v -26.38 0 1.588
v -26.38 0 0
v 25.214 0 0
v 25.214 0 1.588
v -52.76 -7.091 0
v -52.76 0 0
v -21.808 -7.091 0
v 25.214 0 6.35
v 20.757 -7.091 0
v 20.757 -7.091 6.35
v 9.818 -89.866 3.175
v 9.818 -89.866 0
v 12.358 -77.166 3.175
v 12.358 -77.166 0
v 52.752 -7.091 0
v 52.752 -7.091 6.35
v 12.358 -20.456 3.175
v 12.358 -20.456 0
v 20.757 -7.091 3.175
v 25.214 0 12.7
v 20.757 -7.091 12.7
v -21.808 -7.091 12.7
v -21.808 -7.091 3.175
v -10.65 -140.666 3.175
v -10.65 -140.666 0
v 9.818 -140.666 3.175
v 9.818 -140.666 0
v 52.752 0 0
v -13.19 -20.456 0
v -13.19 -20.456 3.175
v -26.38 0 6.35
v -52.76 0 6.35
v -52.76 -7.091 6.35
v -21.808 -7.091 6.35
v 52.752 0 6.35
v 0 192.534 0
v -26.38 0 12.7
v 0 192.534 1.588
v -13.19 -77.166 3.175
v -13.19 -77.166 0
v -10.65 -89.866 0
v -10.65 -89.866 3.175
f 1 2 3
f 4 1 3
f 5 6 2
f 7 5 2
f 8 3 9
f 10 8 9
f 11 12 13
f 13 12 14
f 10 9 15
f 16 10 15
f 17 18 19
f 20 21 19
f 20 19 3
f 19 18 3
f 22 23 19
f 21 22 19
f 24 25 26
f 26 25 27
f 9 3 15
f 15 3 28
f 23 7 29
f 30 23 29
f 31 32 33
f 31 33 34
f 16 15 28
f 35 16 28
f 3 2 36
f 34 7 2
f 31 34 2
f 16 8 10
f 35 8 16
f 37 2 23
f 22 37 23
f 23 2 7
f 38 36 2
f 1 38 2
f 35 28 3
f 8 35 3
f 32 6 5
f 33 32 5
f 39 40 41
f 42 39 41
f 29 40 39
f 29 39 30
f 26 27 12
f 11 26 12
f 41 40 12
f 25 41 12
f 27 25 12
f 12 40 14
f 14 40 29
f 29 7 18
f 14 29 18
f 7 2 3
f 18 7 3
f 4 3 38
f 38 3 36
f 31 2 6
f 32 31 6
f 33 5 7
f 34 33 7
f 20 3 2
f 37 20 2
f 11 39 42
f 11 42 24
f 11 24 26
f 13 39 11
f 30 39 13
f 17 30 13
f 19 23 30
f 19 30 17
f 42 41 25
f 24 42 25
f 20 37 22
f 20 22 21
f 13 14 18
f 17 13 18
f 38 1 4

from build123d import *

# Parameters (mm, degrees)
F1_DEPTH = 1.5875
F2_DEPTH = 6.35
F3_DEPTH = 12.7
F0_W     = 25.548312813
F0_H     = 56.7093666971
F4_DEPTH = 3.175


# Not quite as in the source:
# - a length typed as a fraction of an inch, garbled in the dataset ("3 / 203.2 mm" for 3/8 in), is restored


with BuildPart() as f1:
    # F0 (on Top) → F1 (new body)
    with BuildSketch(Plane.XY):
        Polygon((0, 192.5335675478), (0, 0), (25.2136345953, 0), align=None)
        Polygon((-26.3801887631, 0), (0, 0), (0, 192.5335675478), align=None)
    extrude(amount=F1_DEPTH)


with BuildPart() as f2:
    # F0 (on Top) → F2 (new body)
    with BuildSketch(Plane.XY):
        Polygon((52.7516193688, 0), (25.2136345953, 0), (20.757119148, -7.0914621465), (52.7516193688, -7.0914621465), align=None)
    extrude(amount=F2_DEPTH)


with BuildPart() as f2b:
    # F0 (on Top) → F2, piece 2 (new body)
    with BuildSketch(Plane.XY):
        Polygon((-21.8076522841, -7.0914621465), (-26.3801887631, 0), (-52.7603775263, 0), (-52.7603775263, -7.0914621465), align=None)
    extrude(amount=F2_DEPTH)


with BuildPart() as f3:
    # F0 (on Top) → F3 (new body)
    with BuildSketch(Plane.XY):
        Polygon((25.2136345953, 0), (0, 0), (-26.3801887631, 0), (-21.8076522841, -7.0914621465), (20.757119148, -7.0914621465), align=None)
    extrude(amount=F3_DEPTH)

    # F0 (on Top) → F4 (join)
    with BuildSketch(Plane.XY):
        Polygon((12.3582184315, -77.1656398058), (-13.1900943816, -77.1656398058), (-10.6500943816, -89.8656398058), (-10.6500943816, -140.6656398058), (9.8182184315, -140.6656398058), (9.8182184315, -89.8656398058), align=None)
        with Locations((-0.415937975, -48.8109564573)):
            Rectangle(F0_W, F0_H)
        Polygon((20.757119148, -7.0914621465), (-21.8076522841, -7.0914621465), (-13.1900943816, -20.4562731087), (12.3582184315, -20.4562731087), align=None)
    extrude(amount=F4_DEPTH)


solid = Compound([f1.part, f2.part, f2b.part, f3.part])
